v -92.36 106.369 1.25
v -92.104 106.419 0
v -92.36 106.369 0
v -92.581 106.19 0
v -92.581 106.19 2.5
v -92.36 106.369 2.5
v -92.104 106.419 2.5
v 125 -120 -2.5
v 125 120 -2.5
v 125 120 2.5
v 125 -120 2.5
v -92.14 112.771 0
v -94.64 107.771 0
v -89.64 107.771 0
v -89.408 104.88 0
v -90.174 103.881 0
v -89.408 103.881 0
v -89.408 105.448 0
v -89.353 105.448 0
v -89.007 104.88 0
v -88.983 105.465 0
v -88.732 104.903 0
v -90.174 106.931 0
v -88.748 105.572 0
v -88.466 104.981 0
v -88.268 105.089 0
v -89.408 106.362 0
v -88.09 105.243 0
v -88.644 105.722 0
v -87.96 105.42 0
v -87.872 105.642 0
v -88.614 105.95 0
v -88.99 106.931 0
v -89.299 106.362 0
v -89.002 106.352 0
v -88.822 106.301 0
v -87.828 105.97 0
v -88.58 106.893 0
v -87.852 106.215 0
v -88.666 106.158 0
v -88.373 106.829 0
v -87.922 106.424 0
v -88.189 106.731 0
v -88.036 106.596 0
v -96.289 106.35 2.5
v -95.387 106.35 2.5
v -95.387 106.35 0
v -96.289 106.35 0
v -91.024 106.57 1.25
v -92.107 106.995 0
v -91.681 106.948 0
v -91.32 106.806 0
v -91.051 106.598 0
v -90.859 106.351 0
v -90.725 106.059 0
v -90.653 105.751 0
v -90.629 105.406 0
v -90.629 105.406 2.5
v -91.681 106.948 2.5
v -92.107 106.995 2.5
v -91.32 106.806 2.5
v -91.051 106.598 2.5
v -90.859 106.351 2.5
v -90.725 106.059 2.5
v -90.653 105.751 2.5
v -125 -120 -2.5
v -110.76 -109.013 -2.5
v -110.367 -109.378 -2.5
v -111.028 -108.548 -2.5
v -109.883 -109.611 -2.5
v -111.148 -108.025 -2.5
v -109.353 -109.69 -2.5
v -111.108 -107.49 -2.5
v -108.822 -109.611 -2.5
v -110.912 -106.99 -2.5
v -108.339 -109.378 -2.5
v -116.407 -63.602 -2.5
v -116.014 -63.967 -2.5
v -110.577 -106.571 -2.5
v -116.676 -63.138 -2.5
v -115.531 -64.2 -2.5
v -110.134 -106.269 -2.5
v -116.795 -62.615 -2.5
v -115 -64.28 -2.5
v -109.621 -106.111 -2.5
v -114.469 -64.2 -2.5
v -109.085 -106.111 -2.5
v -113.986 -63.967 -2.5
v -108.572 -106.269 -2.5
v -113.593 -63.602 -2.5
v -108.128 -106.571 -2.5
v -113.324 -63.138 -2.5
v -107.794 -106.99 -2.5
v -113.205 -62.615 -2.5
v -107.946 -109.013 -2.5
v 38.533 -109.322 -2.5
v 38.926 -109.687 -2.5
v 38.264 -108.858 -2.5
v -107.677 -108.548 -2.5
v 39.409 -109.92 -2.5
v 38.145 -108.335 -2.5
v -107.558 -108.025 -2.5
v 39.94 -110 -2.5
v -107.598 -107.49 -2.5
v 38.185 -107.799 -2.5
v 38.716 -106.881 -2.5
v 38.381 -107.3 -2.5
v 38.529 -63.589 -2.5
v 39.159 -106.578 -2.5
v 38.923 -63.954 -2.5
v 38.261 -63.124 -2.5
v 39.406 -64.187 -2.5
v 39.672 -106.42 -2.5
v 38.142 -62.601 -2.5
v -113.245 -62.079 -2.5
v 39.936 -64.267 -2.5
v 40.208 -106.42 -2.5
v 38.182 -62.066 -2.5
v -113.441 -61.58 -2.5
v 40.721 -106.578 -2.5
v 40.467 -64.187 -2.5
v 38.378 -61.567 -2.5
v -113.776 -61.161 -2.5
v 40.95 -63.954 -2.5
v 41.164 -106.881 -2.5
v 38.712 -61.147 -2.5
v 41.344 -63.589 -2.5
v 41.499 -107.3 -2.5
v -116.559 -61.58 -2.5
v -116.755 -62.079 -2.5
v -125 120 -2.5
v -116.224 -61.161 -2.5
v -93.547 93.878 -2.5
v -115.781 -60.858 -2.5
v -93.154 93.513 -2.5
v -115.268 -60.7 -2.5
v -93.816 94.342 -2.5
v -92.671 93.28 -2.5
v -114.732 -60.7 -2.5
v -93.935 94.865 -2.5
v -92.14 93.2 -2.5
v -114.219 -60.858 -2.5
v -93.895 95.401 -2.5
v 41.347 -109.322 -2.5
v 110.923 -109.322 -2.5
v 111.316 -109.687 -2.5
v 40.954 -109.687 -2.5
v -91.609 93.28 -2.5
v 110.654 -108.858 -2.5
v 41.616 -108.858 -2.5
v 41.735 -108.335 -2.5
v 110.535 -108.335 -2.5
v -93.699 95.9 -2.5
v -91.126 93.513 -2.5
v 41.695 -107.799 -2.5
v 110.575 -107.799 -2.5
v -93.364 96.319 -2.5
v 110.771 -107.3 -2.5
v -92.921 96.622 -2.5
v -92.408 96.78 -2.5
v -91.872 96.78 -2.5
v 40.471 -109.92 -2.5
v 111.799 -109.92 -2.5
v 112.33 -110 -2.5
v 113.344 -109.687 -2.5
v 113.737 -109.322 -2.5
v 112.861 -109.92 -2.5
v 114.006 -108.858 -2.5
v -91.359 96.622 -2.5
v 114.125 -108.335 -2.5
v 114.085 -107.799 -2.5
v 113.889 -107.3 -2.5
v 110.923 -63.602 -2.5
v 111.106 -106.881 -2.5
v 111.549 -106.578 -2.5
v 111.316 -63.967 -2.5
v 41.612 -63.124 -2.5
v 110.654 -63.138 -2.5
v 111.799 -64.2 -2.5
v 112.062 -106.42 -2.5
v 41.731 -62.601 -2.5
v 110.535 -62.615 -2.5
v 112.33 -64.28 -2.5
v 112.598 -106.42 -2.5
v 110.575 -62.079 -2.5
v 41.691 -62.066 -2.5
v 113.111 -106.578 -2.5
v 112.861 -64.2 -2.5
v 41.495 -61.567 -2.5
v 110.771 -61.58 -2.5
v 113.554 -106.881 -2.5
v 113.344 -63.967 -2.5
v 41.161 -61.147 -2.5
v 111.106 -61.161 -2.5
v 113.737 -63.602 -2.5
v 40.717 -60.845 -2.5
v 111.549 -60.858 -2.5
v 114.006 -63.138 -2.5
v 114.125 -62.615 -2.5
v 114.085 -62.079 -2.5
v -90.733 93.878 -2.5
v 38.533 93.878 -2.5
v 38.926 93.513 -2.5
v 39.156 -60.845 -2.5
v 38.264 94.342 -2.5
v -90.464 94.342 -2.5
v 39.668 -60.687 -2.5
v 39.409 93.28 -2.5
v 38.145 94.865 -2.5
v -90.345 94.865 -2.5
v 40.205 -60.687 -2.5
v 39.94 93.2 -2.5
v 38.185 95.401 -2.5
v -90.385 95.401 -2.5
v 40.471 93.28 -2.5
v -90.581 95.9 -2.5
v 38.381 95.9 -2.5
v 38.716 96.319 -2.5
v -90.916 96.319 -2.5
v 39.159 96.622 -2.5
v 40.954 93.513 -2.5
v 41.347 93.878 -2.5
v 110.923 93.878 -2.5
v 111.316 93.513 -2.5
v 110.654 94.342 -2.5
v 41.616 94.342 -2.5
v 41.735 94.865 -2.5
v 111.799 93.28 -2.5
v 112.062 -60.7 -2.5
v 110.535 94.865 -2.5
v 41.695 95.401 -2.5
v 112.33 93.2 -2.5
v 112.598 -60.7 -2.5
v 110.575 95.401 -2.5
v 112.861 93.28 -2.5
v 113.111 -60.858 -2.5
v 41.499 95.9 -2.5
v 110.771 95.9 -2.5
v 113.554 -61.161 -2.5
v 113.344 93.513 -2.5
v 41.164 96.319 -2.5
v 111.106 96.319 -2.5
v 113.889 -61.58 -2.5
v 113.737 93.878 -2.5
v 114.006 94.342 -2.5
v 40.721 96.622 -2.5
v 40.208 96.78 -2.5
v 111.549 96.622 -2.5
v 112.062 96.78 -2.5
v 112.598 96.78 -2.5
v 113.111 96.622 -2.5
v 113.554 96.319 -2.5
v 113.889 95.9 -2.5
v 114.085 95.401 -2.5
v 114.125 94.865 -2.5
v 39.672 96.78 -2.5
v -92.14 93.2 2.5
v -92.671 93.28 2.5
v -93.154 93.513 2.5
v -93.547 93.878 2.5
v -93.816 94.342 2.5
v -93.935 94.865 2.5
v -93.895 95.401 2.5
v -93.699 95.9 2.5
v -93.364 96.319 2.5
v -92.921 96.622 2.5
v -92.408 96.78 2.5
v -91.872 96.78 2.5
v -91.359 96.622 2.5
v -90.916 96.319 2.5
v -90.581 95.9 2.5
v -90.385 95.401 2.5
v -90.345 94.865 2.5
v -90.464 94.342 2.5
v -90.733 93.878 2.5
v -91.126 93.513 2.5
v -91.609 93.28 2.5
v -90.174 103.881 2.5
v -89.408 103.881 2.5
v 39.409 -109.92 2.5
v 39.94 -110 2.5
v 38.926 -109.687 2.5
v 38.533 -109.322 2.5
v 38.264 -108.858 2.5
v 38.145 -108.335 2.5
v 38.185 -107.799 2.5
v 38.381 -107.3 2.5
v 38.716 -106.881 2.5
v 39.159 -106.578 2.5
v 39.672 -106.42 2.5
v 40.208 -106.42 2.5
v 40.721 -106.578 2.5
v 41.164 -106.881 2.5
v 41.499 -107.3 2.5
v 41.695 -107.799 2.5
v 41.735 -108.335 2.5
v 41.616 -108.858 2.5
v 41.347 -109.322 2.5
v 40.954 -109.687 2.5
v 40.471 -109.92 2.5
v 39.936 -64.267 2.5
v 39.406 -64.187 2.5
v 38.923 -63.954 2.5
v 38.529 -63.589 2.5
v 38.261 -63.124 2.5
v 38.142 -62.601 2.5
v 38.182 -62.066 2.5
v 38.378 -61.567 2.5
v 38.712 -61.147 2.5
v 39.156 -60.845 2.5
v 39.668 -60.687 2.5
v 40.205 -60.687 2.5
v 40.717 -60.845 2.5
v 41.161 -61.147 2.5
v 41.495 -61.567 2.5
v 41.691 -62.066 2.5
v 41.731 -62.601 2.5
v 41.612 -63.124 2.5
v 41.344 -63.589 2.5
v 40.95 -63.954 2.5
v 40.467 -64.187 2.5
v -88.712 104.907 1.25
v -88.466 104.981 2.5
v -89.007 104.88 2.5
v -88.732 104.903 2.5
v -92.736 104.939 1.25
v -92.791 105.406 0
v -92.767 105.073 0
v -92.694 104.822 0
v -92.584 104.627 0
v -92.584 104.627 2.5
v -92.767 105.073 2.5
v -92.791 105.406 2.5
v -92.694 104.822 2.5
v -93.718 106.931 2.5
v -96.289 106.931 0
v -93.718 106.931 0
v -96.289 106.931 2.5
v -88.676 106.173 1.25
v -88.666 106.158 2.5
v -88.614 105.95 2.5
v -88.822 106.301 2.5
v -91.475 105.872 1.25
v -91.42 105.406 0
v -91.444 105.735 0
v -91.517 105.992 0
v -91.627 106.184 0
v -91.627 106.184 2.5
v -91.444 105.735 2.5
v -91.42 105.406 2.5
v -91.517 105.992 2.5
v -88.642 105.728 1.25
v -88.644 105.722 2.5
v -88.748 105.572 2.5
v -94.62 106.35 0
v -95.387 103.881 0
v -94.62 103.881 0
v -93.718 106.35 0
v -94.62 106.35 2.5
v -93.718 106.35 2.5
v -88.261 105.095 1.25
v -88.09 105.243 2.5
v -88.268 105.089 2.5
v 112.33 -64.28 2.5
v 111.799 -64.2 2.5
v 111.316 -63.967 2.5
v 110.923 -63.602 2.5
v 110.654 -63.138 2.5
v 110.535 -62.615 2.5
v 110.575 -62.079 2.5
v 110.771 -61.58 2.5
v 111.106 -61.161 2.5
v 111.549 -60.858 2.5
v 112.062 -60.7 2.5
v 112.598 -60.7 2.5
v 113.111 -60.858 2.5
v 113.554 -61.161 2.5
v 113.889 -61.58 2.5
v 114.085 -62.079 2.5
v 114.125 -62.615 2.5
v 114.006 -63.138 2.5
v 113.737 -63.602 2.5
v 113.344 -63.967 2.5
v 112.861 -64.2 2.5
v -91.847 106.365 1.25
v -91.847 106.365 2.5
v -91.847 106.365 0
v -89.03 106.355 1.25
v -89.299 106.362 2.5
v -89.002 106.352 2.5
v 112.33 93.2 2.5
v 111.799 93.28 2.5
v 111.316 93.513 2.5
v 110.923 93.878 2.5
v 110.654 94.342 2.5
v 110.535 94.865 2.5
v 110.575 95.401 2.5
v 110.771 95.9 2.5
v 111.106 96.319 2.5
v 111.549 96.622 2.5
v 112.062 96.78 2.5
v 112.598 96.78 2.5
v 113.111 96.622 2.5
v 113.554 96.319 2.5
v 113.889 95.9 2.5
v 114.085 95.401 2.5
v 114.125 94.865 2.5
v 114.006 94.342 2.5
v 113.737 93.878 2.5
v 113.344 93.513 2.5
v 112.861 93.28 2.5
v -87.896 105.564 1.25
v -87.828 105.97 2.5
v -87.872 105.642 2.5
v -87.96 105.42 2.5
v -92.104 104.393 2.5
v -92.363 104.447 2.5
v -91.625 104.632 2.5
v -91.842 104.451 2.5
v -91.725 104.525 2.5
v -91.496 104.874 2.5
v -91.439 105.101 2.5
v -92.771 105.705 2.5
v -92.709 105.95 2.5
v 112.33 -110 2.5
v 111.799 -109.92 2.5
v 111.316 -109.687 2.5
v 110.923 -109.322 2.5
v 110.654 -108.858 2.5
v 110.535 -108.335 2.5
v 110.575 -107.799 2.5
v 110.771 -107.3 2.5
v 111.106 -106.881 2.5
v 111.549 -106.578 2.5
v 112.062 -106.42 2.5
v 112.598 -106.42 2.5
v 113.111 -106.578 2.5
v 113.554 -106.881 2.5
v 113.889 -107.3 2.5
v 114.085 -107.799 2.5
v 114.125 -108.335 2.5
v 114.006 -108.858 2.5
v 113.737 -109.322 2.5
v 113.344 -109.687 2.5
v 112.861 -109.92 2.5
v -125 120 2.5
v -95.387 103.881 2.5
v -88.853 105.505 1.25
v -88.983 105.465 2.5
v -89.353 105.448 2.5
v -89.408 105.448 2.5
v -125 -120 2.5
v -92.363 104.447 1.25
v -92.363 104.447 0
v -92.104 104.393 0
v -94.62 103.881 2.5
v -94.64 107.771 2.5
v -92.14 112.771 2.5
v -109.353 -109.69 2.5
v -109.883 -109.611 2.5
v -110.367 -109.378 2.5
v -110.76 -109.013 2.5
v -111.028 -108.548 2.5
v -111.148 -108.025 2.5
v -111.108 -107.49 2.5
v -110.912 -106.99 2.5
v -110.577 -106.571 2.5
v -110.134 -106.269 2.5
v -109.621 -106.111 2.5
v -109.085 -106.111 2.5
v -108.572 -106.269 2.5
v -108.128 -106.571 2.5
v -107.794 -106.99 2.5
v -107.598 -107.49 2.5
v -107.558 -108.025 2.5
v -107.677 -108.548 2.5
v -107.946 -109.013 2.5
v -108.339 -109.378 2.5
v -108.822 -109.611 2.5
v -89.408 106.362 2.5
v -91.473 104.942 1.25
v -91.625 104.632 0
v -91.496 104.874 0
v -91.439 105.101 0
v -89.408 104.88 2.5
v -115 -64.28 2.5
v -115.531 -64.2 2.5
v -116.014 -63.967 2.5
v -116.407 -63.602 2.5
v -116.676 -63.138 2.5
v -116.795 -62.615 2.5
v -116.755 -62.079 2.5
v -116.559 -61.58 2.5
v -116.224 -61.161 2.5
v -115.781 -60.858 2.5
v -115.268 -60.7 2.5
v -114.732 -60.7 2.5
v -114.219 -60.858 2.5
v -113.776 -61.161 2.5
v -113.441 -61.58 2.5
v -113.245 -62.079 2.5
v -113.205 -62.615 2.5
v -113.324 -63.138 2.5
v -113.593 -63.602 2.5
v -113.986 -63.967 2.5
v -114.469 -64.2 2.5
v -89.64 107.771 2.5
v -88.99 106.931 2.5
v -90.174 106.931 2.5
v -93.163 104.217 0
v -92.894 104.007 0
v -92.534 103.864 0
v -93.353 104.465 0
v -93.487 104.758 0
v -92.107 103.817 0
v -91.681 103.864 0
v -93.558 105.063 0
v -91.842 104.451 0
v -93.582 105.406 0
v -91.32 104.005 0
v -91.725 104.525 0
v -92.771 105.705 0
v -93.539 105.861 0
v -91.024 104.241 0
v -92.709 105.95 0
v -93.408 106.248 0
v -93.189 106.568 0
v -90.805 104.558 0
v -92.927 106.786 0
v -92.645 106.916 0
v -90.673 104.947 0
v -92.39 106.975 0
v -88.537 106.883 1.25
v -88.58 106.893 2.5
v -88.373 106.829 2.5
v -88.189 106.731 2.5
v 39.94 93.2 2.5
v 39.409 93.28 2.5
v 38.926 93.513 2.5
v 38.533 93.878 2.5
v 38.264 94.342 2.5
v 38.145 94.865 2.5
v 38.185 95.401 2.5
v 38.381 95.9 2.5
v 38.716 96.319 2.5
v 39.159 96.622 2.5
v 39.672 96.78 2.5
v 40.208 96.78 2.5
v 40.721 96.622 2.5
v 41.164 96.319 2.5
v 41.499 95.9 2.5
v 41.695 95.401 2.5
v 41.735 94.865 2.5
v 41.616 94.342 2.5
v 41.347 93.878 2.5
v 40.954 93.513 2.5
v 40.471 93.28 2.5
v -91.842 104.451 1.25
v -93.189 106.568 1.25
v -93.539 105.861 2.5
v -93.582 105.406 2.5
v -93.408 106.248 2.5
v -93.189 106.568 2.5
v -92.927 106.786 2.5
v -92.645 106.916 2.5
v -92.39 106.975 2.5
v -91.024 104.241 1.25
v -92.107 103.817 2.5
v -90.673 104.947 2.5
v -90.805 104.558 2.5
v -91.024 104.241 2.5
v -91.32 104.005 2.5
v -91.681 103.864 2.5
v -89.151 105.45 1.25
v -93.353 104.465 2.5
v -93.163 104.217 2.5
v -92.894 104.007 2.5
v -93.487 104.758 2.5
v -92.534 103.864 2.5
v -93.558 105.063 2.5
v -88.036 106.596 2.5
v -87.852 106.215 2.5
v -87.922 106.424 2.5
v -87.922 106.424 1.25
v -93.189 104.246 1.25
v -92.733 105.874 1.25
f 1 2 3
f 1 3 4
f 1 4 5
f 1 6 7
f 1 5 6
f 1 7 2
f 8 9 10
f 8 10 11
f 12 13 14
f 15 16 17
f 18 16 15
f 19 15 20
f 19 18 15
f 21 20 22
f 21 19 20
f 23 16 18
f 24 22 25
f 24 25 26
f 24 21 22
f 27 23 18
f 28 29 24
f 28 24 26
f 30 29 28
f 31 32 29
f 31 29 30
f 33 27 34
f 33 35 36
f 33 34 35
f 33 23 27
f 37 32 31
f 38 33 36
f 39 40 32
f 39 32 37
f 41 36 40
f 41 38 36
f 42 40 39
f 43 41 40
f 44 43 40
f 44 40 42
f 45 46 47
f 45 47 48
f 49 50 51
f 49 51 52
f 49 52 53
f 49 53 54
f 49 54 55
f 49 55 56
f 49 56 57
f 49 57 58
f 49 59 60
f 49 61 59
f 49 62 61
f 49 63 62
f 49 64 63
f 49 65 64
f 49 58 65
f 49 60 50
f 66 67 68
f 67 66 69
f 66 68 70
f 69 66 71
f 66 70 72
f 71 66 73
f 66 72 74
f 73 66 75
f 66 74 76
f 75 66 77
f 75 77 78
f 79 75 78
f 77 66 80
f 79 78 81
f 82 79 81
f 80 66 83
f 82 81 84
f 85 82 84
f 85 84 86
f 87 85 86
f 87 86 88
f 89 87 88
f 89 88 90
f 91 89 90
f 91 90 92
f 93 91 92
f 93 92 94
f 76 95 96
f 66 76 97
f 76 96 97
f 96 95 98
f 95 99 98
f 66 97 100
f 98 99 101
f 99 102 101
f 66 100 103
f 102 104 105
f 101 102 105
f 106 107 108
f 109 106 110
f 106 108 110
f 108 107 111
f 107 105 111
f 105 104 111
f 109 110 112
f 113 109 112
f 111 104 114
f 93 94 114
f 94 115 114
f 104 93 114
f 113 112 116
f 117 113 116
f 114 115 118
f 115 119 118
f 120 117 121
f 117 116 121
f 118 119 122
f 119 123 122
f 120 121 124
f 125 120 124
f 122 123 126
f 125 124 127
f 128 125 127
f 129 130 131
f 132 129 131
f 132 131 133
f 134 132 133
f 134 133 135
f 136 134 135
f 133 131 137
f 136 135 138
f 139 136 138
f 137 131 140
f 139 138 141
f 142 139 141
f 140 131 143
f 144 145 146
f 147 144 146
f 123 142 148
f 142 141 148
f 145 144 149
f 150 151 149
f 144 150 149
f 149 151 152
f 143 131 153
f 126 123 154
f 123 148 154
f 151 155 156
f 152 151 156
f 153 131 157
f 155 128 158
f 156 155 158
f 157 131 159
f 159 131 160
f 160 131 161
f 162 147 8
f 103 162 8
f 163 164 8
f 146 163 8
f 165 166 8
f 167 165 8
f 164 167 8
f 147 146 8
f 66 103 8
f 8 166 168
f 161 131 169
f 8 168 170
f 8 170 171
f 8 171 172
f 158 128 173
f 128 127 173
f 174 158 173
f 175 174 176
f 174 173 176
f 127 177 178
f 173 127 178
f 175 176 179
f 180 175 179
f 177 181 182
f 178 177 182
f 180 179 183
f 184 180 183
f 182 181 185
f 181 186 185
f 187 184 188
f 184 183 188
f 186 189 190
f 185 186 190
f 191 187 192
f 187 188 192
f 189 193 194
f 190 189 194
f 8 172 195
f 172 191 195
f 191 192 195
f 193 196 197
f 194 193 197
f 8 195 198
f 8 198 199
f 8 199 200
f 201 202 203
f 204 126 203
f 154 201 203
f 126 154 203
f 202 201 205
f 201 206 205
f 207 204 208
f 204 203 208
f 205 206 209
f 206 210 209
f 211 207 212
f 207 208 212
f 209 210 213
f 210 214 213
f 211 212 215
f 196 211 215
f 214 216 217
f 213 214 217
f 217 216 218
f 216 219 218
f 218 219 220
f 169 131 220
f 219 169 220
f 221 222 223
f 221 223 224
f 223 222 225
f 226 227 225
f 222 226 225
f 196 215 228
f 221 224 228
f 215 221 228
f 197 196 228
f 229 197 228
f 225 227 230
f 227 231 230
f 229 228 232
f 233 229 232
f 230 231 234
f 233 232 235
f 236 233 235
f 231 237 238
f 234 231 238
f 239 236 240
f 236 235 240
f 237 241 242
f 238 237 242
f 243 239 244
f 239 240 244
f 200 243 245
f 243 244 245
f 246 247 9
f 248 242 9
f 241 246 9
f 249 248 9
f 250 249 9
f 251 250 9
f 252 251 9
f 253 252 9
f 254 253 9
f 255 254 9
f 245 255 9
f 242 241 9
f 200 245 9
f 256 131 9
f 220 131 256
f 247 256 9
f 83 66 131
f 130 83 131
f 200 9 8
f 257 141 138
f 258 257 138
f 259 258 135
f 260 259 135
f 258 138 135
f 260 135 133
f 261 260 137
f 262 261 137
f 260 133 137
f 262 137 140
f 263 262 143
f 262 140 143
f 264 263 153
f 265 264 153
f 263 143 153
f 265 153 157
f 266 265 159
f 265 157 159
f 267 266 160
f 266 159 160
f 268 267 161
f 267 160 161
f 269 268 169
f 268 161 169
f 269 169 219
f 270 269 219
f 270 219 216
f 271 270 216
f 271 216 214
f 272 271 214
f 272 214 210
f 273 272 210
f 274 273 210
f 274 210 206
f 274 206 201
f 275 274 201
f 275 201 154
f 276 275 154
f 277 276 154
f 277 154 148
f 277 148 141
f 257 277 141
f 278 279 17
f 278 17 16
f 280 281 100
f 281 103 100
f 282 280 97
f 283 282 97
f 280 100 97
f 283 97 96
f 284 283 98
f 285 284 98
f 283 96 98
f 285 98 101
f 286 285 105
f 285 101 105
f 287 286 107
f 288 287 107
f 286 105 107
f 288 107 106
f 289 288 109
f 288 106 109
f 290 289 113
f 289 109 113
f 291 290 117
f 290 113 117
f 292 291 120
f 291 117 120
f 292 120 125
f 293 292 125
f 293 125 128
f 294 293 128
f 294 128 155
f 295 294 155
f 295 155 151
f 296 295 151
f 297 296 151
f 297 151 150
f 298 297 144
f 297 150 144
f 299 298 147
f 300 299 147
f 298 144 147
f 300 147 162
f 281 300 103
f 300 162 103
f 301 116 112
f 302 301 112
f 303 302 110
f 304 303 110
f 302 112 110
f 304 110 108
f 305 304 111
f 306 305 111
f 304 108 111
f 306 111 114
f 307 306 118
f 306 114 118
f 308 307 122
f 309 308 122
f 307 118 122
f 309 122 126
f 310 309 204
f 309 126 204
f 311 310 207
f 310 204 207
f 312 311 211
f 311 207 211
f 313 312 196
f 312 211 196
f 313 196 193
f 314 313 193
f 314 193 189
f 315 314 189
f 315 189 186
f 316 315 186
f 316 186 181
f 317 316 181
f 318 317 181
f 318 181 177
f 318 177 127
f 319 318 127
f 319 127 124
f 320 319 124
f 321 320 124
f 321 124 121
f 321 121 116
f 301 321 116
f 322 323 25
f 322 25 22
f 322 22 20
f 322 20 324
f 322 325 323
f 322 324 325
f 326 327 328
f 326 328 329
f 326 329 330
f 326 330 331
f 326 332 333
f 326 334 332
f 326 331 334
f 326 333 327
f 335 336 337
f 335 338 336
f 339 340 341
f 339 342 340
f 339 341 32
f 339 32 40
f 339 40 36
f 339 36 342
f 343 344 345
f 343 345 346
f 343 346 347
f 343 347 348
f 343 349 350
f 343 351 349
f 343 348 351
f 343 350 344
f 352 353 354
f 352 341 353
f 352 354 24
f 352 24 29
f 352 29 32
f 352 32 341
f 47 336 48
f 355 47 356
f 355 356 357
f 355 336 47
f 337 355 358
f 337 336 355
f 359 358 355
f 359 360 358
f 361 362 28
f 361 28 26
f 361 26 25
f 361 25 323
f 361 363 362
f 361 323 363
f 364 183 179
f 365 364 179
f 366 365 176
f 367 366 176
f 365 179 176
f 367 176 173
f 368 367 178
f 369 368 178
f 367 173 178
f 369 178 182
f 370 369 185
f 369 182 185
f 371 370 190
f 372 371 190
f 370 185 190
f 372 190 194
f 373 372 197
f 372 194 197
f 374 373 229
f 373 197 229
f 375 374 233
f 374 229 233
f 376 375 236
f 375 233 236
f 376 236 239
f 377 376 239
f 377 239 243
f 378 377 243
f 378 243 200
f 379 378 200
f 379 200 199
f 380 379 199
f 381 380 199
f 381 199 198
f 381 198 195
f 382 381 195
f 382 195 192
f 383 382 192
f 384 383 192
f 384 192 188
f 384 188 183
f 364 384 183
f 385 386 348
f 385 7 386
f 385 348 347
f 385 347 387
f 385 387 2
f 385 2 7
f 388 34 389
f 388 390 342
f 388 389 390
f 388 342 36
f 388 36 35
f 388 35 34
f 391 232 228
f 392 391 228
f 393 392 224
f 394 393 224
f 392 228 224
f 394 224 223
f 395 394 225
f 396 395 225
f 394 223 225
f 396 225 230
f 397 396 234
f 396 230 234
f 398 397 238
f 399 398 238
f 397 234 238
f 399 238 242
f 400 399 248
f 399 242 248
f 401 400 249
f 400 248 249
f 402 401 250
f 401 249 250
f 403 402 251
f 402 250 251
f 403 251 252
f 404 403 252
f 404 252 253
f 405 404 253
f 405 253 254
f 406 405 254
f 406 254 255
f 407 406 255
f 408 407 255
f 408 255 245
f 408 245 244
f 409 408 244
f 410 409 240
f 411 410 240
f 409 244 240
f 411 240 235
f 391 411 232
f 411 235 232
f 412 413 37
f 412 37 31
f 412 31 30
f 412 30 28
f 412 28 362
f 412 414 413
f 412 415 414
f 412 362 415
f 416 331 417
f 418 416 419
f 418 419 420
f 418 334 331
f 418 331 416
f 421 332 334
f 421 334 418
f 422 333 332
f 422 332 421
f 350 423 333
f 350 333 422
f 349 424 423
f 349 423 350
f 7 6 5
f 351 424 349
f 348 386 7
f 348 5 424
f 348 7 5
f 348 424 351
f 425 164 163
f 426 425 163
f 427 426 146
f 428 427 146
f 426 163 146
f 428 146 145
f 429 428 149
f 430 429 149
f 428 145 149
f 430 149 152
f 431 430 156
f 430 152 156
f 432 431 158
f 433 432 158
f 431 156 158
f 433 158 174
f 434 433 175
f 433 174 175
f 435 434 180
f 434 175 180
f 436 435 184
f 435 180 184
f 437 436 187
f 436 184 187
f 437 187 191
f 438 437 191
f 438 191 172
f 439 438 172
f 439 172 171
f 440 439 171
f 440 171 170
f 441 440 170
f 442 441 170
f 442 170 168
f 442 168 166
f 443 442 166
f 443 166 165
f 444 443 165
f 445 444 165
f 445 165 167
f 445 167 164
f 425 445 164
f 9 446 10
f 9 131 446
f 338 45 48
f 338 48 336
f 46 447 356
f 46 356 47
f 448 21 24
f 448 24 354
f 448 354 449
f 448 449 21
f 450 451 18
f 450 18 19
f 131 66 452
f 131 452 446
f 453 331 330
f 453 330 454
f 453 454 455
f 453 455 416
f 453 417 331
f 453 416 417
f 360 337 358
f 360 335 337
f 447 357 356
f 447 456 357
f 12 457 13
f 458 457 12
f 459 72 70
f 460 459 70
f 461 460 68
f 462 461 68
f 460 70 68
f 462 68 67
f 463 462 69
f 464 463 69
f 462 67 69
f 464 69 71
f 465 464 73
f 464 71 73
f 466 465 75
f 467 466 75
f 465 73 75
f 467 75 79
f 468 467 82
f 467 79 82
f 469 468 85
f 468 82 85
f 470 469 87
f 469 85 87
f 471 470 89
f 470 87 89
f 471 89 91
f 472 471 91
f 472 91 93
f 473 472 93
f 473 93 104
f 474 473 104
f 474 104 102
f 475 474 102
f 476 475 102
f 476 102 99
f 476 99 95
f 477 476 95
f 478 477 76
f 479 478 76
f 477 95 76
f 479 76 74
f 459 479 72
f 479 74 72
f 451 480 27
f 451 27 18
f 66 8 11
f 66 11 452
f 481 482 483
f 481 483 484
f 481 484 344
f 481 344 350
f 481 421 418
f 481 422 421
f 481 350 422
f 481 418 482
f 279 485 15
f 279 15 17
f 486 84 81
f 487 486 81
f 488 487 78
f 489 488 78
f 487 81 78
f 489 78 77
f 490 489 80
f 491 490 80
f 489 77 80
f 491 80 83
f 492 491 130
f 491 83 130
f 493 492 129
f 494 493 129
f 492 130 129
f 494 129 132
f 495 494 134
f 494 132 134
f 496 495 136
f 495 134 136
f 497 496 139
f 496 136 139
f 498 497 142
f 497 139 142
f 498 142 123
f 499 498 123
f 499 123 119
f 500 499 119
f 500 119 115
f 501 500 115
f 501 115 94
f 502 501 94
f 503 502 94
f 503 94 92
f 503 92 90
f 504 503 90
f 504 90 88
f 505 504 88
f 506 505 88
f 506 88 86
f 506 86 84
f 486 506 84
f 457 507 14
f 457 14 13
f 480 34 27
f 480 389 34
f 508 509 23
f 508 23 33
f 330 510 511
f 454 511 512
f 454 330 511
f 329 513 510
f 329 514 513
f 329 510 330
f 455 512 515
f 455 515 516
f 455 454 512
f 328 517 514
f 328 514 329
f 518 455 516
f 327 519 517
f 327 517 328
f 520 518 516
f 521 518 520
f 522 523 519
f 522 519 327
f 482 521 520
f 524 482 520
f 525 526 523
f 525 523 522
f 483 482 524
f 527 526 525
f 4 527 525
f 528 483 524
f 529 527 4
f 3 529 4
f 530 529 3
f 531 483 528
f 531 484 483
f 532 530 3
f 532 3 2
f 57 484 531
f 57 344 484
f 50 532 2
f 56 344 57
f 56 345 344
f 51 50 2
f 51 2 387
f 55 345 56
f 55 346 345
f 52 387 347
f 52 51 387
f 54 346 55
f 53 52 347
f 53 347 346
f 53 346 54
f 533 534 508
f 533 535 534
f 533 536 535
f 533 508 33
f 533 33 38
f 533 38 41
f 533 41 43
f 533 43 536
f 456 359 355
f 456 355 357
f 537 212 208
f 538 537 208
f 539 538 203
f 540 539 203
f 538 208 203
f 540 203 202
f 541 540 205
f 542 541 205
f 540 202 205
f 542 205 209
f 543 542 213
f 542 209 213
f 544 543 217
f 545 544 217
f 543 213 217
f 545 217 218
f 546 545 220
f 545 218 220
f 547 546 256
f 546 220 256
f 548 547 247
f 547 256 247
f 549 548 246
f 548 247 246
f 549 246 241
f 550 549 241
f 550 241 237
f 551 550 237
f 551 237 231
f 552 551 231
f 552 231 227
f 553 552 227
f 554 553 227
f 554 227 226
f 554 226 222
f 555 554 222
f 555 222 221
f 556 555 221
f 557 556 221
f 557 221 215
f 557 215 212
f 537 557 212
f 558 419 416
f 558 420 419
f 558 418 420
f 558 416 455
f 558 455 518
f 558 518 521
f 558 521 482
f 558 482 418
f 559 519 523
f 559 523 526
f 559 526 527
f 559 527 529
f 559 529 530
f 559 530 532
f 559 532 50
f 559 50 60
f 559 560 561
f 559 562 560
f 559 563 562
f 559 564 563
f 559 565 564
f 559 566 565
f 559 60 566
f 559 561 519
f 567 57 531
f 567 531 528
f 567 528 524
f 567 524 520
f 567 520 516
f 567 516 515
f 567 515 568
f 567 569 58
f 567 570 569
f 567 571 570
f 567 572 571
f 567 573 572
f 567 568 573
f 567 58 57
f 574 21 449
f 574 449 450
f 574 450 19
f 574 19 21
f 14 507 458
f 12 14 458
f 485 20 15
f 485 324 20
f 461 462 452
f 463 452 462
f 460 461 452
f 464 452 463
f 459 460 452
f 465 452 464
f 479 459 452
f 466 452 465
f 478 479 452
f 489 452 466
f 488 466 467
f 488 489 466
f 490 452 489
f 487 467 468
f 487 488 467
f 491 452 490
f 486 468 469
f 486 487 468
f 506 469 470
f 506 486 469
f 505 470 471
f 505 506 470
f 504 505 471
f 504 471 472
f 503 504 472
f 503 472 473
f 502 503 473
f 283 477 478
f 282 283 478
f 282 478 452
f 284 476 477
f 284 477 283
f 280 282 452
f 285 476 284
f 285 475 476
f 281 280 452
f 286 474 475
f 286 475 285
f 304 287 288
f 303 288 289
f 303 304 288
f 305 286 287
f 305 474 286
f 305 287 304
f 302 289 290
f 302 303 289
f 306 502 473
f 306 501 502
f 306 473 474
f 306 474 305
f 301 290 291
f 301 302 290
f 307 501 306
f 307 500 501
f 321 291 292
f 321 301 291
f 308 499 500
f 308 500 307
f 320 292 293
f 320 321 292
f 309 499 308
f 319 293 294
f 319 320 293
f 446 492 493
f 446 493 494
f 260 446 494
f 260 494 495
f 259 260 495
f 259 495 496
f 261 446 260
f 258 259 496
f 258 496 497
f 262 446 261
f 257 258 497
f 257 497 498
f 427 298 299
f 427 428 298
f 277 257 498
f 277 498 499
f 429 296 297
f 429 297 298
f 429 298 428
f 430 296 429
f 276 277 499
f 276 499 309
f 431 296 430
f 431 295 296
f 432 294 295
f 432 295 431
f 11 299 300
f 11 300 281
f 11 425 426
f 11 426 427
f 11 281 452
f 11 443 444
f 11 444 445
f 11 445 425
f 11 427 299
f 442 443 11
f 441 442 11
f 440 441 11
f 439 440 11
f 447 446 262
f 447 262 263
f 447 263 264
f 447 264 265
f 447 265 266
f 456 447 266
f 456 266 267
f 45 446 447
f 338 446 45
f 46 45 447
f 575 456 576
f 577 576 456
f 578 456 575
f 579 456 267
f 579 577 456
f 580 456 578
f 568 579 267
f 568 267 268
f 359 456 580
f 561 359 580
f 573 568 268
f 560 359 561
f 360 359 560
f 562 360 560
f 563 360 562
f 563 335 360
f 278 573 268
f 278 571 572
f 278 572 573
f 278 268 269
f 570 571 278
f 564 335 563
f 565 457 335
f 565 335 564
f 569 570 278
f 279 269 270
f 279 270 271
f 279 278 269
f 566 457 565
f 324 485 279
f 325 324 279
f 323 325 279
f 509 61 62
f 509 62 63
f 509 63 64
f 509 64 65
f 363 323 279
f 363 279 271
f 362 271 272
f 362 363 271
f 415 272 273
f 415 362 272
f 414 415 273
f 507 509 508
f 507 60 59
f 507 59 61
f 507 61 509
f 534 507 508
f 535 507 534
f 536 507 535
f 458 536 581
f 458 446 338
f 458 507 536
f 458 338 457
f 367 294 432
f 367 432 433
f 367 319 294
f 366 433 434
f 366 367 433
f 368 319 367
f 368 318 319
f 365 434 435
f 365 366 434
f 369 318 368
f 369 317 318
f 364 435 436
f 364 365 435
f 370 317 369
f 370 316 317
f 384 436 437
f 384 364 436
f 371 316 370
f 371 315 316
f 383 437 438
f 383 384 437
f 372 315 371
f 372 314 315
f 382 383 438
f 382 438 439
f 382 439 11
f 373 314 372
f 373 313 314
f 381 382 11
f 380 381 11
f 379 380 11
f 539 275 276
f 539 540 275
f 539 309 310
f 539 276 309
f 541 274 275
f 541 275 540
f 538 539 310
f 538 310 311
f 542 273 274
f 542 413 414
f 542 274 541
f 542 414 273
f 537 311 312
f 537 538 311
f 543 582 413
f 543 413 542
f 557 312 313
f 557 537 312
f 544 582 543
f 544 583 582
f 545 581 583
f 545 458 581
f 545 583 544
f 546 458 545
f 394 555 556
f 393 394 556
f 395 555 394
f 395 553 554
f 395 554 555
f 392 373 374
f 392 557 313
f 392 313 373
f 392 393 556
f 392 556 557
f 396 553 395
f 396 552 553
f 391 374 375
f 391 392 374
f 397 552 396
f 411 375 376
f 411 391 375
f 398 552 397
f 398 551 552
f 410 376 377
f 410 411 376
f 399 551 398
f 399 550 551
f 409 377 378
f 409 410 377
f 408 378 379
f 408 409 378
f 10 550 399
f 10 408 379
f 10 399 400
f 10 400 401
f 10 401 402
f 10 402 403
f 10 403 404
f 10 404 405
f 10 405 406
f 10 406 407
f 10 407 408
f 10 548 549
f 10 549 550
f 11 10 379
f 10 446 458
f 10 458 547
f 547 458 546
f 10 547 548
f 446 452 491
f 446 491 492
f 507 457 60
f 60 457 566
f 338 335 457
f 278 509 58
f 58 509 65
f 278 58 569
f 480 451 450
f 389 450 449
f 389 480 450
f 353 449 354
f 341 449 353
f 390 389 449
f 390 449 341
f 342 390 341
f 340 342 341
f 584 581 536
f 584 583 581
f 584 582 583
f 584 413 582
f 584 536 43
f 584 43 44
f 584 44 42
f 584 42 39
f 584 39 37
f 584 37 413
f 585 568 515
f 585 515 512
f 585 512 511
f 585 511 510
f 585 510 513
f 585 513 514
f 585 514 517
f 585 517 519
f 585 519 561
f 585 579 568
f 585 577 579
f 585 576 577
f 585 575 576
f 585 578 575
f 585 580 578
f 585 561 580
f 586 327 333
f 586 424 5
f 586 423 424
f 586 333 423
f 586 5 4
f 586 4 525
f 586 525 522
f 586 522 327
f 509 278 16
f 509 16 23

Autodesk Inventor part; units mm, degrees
ref_plane "YZ Plane" through (0, 0, 0) normal (1, 0, 0) x (0, 1, 0)
ref_plane "XZ Plane" through (0, 0, 0) normal (0, 1, 0) x (-1, 0, 0)
ref_plane "XY Plane" through (0, 0, 0) normal (0, 0, 1) x (1, 0, 0)
sketch "Sketch1" plane through (0, 0, 0) normal (0, 0, 1) x (1, 0, 0)
  line L0 (-125, 120) -> (125, 120)
  line L1 (125, 120) -> (125, -120)
  line L2 (125, -120) -> (-125, -120)
  line L3 (-125, -120) -> (-125, 120)
  point P0 (0, 0)
  dimension "d0" = 250
  dimension "d1" = 240
  dimension "d2" = 125
  dimension "d3" = 120
extrude "Extrusion1" add sketch "Sketch1" along normal mid plane 5
sketch "Sketch3" plane through (0, 0, 2.5) normal (0, 0, 1) x (1, 0, 0)
  line L0 (125, 120) -> (-125, 120) projected
  line L1 (-115, 95) -> (-115, -108.2)
  line L2 (-125, -120) -> (125, -120) projected
  line L3 (-92.14, 95) -> (-92.14, -120)
  line L4 (39.94, 95) -> (39.94, -108.2)
  line L5 (112.33, 95) -> (112.33, -108.2)
  line L6 (125, -120) -> (125, 120)
  line L7 (112.33, -62.48) -> (-115, -62.48)
  line L8 (-125, 120) -> (-125, -120)
  line L9 (112.33, -108.2) -> (-115, -108.2)
  line L10 (-115, 95) -> (112.33, 95)
  point P0 (0, 0)
  point P1 (-109.3528, -107.8905)
  point P2 (39.9365, -62.4666)
  dimension "d6" = 10
  dimension "d7" = 22.86
  dimension "d8" = 132.08
  dimension "d9" = 72.39
  dimension "d11" = 25
  dimension "d12" = 157.48
  dimension "d13" = 45.72
hole "Hole1" at (-92.14, 95, 2.5) at (39.94, 95, 2.5) at (112.33, 95, 2.5) at (112.33, -62.48, 2.5) at (112.33, -108.2, 2.5) at (39.94, -108.2, 2.5) at (-109.3528, -107.8905, 2.5) at (-115, -62.48, 2.5) at (39.9365, -62.4666, 2.5) direction (0, 0, -1) diameter 3.6 end through all
sketch "Sketch4" plane through (0, 0, 2.5) normal (0, 0, 1) x (1, 0, 0)
  line L0 (-92.14, 112.7708) -> (-92.14, 107.7708)
  line L1 (-92.14, 107.7708) -> (-89.64, 107.7708)
  line L2 (-89.64, 107.7708) -> (-92.14, 112.7708)
  circle A0 centre (-92.14, 95) radius 1.8 projected
  line L3 (-92.14, 107.7708) -> (-94.64, 107.7708)
  line L4 (-94.64, 107.7708) -> (-92.14, 112.7708)
  line L5 (-96.2888, 106.9952) -> (-87.7345, 106.9952) construction
  line L6 (-87.7345, 106.9952) -> (-87.7345, 103.8167) construction
  line L7 (-87.7345, 103.8167) -> (-96.2888, 103.8167) construction
  line L8 (-96.2888, 103.8167) -> (-96.2888, 106.9952) construction
  line L9 (-95.3867, 103.8809) -> (-95.3867, 106.3501)
  line L10 (-95.3867, 106.3501) -> (-96.2888, 106.3501)
  line L11 (-96.2888, 106.3501) -> (-96.2888, 106.9309)
  line L12 (-96.2888, 106.9309) -> (-93.7183, 106.9309)
  line L13 (-93.7183, 106.9309) -> (-93.7183, 106.3501)
  line L14 (-93.7183, 106.3501) -> (-94.6205, 106.3501)
  line L15 (-94.6205, 106.3501) -> (-94.6205, 103.8809)
  line L16 (-94.6205, 103.8809) -> (-95.3867, 103.8809)
  spline S0 degree 2 poles (-90.6288, 105.4059) (-90.6288, 104.6645) (-91.4197, 103.8167) (-92.1068, 103.8167) knots 0 0 0 1 2 2 2
  spline S1 degree 2 poles (-92.1068, 103.8167) (-92.7964, 103.8167) (-93.5824, 104.6743) (-93.5824, 105.4059) knots 0 0 0 1 2 2 2
  spline S2 degree 2 poles (-93.5824, 105.4059) (-93.5824, 106.14) (-92.7964, 106.9952) (-92.1068, 106.9952) knots 0 0 0 1 2 2 2
  spline S3 degree 2 poles (-92.1068, 106.9952) (-91.4197, 106.9952) (-90.6288, 106.145) (-90.6288, 105.4059) knots 0 0 0 1 2 2 2
  spline S4 degree 2 poles (-91.4197, 105.4059) (-91.4197, 105.6803) (-91.5309, 106.0634) (-91.6273, 106.1845) knots 0 0 0 1 2 2 2
  spline S5 degree 2 poles (-91.6273, 106.1845) (-91.7237, 106.3106) (-91.9709, 106.4193) (-92.1043, 106.4193) knots 0 0 0 1 2 2 2
  spline S6 degree 2 poles (-92.1043, 106.4193) (-92.2452, 106.4193) (-92.4751, 106.318) (-92.5813, 106.1895) knots 0 0 0 1 2 2 2
  spline S7 degree 2 poles (-92.5813, 106.1895) (-92.6753, 106.0708) (-92.7914, 105.6778) (-92.7914, 105.4059) knots 0 0 0 1 2 2 2
  spline S8 degree 2 poles (-92.7914, 105.4059) (-92.7914, 105.1242) (-92.6802, 104.7534) (-92.5838, 104.6274) knots 0 0 0 1 2 2 2
  spline S9 degree 2 poles (-92.5838, 104.6274) (-92.4874, 104.5013) (-92.2378, 104.3926) (-92.1043, 104.3926) knots 0 0 0 1 2 2 2
  spline S10 degree 2 poles (-92.1043, 104.3926) (-91.9684, 104.3926) (-91.7163, 104.5087) (-91.6248, 104.6323) knots 0 0 0 1 2 2 2
  spline S11 degree 2 poles (-91.6248, 104.6323) (-91.526, 104.7658) (-91.4197, 105.1192) (-91.4197, 105.4059) knots 0 0 0 1 2 2 2
  spline S12 degree 2 poles (-87.8284, 105.9695) (-87.8284, 105.7569) (-87.9643, 105.3713) (-88.0904, 105.2428) knots 0 0 0 1 2 2 2
  spline S13 degree 2 poles (-88.0904, 105.2428) (-88.167, 105.1613) (-88.3549, 105.0278) (-88.4661, 104.9808) knots 0 0 0 1 2 2 2
  spline S14 degree 2 poles (-88.4661, 104.9808) (-88.5798, 104.9339) (-88.8442, 104.8795) (-89.0074, 104.8795) knots 0 0 0 1 2 2 2
  line L17 (-89.0074, 104.8795) -> (-89.4078, 104.8795)
  line L18 (-89.4078, 104.8795) -> (-89.4078, 103.8809)
  line L19 (-89.4078, 103.8809) -> (-90.174, 103.8809)
  line L20 (-90.174, 103.8809) -> (-90.174, 106.9309)
  line L21 (-90.174, 106.9309) -> (-88.9901, 106.9309)
  spline S15 degree 2 poles (-88.9901, 106.9309) (-88.7281, 106.9309) (-88.345, 106.8346) (-88.1893, 106.7307) knots 0 0 0 1 2 2 2
  spline S16 degree 2 poles (-88.1893, 106.7307) (-88.0162, 106.6146) (-87.8284, 106.2339) (-87.8284, 105.9695) knots 0 0 0 1 2 2 2
  spline S17 degree 2 poles (-88.6144, 105.9497) (-88.6144, 106.0807) (-88.738, 106.2661) (-88.822, 106.3007) knots 0 0 0 1 2 2 2
  spline S18 degree 2 poles (-88.822, 106.3007) (-88.9307, 106.3476) (-89.1285, 106.3625) (-89.299, 106.3625) knots 0 0 0 1 2 2 2
  line L22 (-89.299, 106.3625) -> (-89.4078, 106.3625)
  line L23 (-89.4078, 106.3625) -> (-89.4078, 105.448)
  line L24 (-89.4078, 105.448) -> (-89.3534, 105.448)
  spline S19 degree 2 poles (-89.3534, 105.448) (-89.2471, 105.448) (-89.0543, 105.4529) (-88.9826, 105.4653) knots 0 0 0 1 2 2 2
  spline S20 degree 2 poles (-88.9826, 105.4653) (-88.9209, 105.4752) (-88.7849, 105.5345) (-88.7478, 105.5715) knots 0 0 0 1 2 2 2
  spline S21 degree 2 poles (-88.7478, 105.5715) (-88.6687, 105.6457) (-88.6144, 105.8113) (-88.6144, 105.9497) knots 0 0 0 1 2 2 2
  point P0 (0, 0)
  dimension "d21" = 5
extrude "Extrusion2" cut sketch "Sketch4" against normal blind 2.5 contours L2 L1 L0 | L0 L3 L4 | L9 L10 L11 L12 L13 L14 L15 L16 | S0 S1 S2 S3 | S12 S13 S14 L17 L18 L19 L20 L21 S15 S16
equation "\"d2\" = 0.5 * d0"
equation "\"d3\" = 0.5 * d1"
properties part number "MotherboardBase"
